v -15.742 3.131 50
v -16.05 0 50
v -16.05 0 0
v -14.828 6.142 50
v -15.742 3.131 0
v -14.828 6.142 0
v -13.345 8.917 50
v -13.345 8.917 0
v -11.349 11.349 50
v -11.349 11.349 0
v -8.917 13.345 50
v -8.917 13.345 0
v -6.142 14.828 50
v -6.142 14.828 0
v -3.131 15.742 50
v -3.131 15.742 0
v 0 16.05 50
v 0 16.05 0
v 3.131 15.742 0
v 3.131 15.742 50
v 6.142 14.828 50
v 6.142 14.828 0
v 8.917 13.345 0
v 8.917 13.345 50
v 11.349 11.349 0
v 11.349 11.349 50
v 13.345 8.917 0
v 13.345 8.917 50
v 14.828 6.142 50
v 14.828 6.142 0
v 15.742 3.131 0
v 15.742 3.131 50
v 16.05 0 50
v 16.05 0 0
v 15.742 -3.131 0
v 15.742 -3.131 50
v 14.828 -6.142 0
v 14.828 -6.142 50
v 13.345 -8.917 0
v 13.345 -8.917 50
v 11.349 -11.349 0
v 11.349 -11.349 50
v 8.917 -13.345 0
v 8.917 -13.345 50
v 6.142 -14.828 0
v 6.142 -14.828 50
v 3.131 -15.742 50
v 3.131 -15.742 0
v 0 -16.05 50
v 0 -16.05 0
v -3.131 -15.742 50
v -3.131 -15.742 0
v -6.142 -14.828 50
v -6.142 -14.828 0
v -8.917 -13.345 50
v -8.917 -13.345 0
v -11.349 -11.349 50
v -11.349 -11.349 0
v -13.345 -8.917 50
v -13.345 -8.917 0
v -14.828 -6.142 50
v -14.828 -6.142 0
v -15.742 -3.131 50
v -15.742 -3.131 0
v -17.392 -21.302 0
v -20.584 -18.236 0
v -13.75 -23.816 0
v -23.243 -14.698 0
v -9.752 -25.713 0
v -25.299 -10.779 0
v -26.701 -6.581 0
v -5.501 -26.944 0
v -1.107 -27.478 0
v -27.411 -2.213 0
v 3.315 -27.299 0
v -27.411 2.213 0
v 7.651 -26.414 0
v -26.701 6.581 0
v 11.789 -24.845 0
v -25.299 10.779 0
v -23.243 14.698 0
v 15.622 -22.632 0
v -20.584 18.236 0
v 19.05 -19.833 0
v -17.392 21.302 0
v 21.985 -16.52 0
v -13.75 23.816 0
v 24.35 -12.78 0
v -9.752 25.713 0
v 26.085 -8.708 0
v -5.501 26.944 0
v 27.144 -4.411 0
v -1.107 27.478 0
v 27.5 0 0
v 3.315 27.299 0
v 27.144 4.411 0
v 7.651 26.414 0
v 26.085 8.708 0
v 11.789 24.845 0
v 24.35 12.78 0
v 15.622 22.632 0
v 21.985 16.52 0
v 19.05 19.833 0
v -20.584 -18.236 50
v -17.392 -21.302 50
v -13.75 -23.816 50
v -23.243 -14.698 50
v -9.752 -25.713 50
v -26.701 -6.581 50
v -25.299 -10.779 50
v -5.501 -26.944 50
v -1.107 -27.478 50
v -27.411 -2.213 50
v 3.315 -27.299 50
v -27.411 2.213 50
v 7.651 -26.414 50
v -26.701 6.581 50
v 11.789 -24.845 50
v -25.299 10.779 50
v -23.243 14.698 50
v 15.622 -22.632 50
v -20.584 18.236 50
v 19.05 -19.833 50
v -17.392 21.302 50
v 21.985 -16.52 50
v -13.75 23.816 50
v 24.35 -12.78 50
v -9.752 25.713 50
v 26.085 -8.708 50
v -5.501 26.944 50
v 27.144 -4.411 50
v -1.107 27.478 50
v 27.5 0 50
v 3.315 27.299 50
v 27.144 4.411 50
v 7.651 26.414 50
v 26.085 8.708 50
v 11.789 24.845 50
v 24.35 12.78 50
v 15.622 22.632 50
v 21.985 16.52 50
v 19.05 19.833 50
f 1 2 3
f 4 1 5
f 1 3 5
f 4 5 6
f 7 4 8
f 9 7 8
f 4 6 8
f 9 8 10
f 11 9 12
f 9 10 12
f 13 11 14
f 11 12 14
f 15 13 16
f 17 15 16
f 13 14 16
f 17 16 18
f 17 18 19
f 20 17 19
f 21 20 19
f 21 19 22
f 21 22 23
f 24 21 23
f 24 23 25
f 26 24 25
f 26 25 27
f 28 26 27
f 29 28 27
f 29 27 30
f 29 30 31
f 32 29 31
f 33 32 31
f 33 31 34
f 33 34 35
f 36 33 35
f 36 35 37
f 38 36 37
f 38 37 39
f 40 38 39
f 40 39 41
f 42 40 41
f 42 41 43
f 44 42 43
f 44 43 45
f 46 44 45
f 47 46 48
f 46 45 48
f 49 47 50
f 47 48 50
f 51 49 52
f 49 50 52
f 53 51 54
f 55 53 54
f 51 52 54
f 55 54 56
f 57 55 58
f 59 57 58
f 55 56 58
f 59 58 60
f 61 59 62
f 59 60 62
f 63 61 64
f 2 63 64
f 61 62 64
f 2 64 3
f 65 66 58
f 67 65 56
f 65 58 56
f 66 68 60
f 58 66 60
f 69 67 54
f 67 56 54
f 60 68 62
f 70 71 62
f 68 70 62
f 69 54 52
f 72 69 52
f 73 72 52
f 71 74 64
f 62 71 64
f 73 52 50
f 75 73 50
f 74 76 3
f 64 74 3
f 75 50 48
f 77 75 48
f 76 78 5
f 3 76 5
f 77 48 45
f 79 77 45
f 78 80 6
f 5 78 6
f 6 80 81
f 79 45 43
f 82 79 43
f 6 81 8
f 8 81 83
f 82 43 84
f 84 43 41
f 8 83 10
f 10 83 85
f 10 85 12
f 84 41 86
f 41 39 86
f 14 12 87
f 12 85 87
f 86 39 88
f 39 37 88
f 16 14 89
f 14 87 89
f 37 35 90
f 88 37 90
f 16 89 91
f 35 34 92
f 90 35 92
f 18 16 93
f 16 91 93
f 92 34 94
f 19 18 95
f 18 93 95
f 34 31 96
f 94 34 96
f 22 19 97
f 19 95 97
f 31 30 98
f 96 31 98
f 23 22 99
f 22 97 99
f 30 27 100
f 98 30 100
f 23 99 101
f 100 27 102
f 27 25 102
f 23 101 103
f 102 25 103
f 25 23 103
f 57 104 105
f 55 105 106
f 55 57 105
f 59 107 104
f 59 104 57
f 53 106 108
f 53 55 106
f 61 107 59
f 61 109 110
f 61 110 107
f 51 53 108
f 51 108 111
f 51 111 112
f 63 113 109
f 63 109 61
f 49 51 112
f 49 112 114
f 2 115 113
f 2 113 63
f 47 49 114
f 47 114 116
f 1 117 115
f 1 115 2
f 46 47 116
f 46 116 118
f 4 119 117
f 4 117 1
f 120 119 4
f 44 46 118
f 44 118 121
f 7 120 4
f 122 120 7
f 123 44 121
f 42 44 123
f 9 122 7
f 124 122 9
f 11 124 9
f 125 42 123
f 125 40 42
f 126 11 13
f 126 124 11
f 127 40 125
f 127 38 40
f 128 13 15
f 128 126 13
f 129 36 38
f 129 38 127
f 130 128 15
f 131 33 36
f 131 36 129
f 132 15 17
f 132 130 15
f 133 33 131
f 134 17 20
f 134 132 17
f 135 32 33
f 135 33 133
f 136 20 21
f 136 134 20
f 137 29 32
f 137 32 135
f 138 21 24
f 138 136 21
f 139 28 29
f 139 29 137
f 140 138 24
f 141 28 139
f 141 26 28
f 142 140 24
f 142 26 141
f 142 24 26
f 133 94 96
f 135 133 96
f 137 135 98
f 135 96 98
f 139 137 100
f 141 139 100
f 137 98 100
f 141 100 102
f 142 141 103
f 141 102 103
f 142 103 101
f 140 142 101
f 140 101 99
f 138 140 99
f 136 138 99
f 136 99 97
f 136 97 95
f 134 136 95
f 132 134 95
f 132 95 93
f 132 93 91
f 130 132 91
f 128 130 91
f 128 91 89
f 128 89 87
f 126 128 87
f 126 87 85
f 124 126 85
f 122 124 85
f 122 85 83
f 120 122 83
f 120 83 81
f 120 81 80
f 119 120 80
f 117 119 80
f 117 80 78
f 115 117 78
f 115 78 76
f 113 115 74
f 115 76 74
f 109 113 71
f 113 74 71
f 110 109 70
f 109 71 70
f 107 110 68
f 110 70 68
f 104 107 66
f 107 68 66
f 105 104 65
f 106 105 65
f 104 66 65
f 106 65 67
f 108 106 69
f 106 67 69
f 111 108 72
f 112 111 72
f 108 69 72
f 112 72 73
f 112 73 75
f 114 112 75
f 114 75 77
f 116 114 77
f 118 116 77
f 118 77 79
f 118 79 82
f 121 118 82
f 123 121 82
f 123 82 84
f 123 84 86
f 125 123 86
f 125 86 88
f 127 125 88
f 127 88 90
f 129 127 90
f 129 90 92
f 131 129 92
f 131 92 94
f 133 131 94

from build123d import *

# Parameters (mm, degrees)
ESQUISSE1_R             = 27.5
BOSS_EXTRU_1_DEPTH      = 20
ESQUISSE2_R             = 27.5
BOSS_EXTRU_2_DEPTH      = 50
ESQUISSE3_R             = 16.05
ENL_V_MAT_EXTRU_1_DEPTH = 51


with BuildPart() as part:
    # Esquisse1 → Boss.-Extru.1 (new body)
    with BuildSketch(Plane.XY):
        Circle(ESQUISSE1_R)
    extrude(amount=BOSS_EXTRU_1_DEPTH)

    # Esquisse2 → Boss.-Extru.2 (add)
    with BuildSketch(Plane.XY):
        Circle(ESQUISSE2_R)
    extrude(amount=BOSS_EXTRU_2_DEPTH)

    # Esquisse3 → Enlèv. mat.-Extru.1 (cut, through all)
    with BuildSketch(Plane(origin=(0, 0, 0), x_dir=(-1, 0, 0), z_dir=(0, 0, -1))):
        Circle(ESQUISSE3_R)
    extrude(amount=-ENL_V_MAT_EXTRU_1_DEPTH, mode=Mode.SUBTRACT)


solid = part.part
